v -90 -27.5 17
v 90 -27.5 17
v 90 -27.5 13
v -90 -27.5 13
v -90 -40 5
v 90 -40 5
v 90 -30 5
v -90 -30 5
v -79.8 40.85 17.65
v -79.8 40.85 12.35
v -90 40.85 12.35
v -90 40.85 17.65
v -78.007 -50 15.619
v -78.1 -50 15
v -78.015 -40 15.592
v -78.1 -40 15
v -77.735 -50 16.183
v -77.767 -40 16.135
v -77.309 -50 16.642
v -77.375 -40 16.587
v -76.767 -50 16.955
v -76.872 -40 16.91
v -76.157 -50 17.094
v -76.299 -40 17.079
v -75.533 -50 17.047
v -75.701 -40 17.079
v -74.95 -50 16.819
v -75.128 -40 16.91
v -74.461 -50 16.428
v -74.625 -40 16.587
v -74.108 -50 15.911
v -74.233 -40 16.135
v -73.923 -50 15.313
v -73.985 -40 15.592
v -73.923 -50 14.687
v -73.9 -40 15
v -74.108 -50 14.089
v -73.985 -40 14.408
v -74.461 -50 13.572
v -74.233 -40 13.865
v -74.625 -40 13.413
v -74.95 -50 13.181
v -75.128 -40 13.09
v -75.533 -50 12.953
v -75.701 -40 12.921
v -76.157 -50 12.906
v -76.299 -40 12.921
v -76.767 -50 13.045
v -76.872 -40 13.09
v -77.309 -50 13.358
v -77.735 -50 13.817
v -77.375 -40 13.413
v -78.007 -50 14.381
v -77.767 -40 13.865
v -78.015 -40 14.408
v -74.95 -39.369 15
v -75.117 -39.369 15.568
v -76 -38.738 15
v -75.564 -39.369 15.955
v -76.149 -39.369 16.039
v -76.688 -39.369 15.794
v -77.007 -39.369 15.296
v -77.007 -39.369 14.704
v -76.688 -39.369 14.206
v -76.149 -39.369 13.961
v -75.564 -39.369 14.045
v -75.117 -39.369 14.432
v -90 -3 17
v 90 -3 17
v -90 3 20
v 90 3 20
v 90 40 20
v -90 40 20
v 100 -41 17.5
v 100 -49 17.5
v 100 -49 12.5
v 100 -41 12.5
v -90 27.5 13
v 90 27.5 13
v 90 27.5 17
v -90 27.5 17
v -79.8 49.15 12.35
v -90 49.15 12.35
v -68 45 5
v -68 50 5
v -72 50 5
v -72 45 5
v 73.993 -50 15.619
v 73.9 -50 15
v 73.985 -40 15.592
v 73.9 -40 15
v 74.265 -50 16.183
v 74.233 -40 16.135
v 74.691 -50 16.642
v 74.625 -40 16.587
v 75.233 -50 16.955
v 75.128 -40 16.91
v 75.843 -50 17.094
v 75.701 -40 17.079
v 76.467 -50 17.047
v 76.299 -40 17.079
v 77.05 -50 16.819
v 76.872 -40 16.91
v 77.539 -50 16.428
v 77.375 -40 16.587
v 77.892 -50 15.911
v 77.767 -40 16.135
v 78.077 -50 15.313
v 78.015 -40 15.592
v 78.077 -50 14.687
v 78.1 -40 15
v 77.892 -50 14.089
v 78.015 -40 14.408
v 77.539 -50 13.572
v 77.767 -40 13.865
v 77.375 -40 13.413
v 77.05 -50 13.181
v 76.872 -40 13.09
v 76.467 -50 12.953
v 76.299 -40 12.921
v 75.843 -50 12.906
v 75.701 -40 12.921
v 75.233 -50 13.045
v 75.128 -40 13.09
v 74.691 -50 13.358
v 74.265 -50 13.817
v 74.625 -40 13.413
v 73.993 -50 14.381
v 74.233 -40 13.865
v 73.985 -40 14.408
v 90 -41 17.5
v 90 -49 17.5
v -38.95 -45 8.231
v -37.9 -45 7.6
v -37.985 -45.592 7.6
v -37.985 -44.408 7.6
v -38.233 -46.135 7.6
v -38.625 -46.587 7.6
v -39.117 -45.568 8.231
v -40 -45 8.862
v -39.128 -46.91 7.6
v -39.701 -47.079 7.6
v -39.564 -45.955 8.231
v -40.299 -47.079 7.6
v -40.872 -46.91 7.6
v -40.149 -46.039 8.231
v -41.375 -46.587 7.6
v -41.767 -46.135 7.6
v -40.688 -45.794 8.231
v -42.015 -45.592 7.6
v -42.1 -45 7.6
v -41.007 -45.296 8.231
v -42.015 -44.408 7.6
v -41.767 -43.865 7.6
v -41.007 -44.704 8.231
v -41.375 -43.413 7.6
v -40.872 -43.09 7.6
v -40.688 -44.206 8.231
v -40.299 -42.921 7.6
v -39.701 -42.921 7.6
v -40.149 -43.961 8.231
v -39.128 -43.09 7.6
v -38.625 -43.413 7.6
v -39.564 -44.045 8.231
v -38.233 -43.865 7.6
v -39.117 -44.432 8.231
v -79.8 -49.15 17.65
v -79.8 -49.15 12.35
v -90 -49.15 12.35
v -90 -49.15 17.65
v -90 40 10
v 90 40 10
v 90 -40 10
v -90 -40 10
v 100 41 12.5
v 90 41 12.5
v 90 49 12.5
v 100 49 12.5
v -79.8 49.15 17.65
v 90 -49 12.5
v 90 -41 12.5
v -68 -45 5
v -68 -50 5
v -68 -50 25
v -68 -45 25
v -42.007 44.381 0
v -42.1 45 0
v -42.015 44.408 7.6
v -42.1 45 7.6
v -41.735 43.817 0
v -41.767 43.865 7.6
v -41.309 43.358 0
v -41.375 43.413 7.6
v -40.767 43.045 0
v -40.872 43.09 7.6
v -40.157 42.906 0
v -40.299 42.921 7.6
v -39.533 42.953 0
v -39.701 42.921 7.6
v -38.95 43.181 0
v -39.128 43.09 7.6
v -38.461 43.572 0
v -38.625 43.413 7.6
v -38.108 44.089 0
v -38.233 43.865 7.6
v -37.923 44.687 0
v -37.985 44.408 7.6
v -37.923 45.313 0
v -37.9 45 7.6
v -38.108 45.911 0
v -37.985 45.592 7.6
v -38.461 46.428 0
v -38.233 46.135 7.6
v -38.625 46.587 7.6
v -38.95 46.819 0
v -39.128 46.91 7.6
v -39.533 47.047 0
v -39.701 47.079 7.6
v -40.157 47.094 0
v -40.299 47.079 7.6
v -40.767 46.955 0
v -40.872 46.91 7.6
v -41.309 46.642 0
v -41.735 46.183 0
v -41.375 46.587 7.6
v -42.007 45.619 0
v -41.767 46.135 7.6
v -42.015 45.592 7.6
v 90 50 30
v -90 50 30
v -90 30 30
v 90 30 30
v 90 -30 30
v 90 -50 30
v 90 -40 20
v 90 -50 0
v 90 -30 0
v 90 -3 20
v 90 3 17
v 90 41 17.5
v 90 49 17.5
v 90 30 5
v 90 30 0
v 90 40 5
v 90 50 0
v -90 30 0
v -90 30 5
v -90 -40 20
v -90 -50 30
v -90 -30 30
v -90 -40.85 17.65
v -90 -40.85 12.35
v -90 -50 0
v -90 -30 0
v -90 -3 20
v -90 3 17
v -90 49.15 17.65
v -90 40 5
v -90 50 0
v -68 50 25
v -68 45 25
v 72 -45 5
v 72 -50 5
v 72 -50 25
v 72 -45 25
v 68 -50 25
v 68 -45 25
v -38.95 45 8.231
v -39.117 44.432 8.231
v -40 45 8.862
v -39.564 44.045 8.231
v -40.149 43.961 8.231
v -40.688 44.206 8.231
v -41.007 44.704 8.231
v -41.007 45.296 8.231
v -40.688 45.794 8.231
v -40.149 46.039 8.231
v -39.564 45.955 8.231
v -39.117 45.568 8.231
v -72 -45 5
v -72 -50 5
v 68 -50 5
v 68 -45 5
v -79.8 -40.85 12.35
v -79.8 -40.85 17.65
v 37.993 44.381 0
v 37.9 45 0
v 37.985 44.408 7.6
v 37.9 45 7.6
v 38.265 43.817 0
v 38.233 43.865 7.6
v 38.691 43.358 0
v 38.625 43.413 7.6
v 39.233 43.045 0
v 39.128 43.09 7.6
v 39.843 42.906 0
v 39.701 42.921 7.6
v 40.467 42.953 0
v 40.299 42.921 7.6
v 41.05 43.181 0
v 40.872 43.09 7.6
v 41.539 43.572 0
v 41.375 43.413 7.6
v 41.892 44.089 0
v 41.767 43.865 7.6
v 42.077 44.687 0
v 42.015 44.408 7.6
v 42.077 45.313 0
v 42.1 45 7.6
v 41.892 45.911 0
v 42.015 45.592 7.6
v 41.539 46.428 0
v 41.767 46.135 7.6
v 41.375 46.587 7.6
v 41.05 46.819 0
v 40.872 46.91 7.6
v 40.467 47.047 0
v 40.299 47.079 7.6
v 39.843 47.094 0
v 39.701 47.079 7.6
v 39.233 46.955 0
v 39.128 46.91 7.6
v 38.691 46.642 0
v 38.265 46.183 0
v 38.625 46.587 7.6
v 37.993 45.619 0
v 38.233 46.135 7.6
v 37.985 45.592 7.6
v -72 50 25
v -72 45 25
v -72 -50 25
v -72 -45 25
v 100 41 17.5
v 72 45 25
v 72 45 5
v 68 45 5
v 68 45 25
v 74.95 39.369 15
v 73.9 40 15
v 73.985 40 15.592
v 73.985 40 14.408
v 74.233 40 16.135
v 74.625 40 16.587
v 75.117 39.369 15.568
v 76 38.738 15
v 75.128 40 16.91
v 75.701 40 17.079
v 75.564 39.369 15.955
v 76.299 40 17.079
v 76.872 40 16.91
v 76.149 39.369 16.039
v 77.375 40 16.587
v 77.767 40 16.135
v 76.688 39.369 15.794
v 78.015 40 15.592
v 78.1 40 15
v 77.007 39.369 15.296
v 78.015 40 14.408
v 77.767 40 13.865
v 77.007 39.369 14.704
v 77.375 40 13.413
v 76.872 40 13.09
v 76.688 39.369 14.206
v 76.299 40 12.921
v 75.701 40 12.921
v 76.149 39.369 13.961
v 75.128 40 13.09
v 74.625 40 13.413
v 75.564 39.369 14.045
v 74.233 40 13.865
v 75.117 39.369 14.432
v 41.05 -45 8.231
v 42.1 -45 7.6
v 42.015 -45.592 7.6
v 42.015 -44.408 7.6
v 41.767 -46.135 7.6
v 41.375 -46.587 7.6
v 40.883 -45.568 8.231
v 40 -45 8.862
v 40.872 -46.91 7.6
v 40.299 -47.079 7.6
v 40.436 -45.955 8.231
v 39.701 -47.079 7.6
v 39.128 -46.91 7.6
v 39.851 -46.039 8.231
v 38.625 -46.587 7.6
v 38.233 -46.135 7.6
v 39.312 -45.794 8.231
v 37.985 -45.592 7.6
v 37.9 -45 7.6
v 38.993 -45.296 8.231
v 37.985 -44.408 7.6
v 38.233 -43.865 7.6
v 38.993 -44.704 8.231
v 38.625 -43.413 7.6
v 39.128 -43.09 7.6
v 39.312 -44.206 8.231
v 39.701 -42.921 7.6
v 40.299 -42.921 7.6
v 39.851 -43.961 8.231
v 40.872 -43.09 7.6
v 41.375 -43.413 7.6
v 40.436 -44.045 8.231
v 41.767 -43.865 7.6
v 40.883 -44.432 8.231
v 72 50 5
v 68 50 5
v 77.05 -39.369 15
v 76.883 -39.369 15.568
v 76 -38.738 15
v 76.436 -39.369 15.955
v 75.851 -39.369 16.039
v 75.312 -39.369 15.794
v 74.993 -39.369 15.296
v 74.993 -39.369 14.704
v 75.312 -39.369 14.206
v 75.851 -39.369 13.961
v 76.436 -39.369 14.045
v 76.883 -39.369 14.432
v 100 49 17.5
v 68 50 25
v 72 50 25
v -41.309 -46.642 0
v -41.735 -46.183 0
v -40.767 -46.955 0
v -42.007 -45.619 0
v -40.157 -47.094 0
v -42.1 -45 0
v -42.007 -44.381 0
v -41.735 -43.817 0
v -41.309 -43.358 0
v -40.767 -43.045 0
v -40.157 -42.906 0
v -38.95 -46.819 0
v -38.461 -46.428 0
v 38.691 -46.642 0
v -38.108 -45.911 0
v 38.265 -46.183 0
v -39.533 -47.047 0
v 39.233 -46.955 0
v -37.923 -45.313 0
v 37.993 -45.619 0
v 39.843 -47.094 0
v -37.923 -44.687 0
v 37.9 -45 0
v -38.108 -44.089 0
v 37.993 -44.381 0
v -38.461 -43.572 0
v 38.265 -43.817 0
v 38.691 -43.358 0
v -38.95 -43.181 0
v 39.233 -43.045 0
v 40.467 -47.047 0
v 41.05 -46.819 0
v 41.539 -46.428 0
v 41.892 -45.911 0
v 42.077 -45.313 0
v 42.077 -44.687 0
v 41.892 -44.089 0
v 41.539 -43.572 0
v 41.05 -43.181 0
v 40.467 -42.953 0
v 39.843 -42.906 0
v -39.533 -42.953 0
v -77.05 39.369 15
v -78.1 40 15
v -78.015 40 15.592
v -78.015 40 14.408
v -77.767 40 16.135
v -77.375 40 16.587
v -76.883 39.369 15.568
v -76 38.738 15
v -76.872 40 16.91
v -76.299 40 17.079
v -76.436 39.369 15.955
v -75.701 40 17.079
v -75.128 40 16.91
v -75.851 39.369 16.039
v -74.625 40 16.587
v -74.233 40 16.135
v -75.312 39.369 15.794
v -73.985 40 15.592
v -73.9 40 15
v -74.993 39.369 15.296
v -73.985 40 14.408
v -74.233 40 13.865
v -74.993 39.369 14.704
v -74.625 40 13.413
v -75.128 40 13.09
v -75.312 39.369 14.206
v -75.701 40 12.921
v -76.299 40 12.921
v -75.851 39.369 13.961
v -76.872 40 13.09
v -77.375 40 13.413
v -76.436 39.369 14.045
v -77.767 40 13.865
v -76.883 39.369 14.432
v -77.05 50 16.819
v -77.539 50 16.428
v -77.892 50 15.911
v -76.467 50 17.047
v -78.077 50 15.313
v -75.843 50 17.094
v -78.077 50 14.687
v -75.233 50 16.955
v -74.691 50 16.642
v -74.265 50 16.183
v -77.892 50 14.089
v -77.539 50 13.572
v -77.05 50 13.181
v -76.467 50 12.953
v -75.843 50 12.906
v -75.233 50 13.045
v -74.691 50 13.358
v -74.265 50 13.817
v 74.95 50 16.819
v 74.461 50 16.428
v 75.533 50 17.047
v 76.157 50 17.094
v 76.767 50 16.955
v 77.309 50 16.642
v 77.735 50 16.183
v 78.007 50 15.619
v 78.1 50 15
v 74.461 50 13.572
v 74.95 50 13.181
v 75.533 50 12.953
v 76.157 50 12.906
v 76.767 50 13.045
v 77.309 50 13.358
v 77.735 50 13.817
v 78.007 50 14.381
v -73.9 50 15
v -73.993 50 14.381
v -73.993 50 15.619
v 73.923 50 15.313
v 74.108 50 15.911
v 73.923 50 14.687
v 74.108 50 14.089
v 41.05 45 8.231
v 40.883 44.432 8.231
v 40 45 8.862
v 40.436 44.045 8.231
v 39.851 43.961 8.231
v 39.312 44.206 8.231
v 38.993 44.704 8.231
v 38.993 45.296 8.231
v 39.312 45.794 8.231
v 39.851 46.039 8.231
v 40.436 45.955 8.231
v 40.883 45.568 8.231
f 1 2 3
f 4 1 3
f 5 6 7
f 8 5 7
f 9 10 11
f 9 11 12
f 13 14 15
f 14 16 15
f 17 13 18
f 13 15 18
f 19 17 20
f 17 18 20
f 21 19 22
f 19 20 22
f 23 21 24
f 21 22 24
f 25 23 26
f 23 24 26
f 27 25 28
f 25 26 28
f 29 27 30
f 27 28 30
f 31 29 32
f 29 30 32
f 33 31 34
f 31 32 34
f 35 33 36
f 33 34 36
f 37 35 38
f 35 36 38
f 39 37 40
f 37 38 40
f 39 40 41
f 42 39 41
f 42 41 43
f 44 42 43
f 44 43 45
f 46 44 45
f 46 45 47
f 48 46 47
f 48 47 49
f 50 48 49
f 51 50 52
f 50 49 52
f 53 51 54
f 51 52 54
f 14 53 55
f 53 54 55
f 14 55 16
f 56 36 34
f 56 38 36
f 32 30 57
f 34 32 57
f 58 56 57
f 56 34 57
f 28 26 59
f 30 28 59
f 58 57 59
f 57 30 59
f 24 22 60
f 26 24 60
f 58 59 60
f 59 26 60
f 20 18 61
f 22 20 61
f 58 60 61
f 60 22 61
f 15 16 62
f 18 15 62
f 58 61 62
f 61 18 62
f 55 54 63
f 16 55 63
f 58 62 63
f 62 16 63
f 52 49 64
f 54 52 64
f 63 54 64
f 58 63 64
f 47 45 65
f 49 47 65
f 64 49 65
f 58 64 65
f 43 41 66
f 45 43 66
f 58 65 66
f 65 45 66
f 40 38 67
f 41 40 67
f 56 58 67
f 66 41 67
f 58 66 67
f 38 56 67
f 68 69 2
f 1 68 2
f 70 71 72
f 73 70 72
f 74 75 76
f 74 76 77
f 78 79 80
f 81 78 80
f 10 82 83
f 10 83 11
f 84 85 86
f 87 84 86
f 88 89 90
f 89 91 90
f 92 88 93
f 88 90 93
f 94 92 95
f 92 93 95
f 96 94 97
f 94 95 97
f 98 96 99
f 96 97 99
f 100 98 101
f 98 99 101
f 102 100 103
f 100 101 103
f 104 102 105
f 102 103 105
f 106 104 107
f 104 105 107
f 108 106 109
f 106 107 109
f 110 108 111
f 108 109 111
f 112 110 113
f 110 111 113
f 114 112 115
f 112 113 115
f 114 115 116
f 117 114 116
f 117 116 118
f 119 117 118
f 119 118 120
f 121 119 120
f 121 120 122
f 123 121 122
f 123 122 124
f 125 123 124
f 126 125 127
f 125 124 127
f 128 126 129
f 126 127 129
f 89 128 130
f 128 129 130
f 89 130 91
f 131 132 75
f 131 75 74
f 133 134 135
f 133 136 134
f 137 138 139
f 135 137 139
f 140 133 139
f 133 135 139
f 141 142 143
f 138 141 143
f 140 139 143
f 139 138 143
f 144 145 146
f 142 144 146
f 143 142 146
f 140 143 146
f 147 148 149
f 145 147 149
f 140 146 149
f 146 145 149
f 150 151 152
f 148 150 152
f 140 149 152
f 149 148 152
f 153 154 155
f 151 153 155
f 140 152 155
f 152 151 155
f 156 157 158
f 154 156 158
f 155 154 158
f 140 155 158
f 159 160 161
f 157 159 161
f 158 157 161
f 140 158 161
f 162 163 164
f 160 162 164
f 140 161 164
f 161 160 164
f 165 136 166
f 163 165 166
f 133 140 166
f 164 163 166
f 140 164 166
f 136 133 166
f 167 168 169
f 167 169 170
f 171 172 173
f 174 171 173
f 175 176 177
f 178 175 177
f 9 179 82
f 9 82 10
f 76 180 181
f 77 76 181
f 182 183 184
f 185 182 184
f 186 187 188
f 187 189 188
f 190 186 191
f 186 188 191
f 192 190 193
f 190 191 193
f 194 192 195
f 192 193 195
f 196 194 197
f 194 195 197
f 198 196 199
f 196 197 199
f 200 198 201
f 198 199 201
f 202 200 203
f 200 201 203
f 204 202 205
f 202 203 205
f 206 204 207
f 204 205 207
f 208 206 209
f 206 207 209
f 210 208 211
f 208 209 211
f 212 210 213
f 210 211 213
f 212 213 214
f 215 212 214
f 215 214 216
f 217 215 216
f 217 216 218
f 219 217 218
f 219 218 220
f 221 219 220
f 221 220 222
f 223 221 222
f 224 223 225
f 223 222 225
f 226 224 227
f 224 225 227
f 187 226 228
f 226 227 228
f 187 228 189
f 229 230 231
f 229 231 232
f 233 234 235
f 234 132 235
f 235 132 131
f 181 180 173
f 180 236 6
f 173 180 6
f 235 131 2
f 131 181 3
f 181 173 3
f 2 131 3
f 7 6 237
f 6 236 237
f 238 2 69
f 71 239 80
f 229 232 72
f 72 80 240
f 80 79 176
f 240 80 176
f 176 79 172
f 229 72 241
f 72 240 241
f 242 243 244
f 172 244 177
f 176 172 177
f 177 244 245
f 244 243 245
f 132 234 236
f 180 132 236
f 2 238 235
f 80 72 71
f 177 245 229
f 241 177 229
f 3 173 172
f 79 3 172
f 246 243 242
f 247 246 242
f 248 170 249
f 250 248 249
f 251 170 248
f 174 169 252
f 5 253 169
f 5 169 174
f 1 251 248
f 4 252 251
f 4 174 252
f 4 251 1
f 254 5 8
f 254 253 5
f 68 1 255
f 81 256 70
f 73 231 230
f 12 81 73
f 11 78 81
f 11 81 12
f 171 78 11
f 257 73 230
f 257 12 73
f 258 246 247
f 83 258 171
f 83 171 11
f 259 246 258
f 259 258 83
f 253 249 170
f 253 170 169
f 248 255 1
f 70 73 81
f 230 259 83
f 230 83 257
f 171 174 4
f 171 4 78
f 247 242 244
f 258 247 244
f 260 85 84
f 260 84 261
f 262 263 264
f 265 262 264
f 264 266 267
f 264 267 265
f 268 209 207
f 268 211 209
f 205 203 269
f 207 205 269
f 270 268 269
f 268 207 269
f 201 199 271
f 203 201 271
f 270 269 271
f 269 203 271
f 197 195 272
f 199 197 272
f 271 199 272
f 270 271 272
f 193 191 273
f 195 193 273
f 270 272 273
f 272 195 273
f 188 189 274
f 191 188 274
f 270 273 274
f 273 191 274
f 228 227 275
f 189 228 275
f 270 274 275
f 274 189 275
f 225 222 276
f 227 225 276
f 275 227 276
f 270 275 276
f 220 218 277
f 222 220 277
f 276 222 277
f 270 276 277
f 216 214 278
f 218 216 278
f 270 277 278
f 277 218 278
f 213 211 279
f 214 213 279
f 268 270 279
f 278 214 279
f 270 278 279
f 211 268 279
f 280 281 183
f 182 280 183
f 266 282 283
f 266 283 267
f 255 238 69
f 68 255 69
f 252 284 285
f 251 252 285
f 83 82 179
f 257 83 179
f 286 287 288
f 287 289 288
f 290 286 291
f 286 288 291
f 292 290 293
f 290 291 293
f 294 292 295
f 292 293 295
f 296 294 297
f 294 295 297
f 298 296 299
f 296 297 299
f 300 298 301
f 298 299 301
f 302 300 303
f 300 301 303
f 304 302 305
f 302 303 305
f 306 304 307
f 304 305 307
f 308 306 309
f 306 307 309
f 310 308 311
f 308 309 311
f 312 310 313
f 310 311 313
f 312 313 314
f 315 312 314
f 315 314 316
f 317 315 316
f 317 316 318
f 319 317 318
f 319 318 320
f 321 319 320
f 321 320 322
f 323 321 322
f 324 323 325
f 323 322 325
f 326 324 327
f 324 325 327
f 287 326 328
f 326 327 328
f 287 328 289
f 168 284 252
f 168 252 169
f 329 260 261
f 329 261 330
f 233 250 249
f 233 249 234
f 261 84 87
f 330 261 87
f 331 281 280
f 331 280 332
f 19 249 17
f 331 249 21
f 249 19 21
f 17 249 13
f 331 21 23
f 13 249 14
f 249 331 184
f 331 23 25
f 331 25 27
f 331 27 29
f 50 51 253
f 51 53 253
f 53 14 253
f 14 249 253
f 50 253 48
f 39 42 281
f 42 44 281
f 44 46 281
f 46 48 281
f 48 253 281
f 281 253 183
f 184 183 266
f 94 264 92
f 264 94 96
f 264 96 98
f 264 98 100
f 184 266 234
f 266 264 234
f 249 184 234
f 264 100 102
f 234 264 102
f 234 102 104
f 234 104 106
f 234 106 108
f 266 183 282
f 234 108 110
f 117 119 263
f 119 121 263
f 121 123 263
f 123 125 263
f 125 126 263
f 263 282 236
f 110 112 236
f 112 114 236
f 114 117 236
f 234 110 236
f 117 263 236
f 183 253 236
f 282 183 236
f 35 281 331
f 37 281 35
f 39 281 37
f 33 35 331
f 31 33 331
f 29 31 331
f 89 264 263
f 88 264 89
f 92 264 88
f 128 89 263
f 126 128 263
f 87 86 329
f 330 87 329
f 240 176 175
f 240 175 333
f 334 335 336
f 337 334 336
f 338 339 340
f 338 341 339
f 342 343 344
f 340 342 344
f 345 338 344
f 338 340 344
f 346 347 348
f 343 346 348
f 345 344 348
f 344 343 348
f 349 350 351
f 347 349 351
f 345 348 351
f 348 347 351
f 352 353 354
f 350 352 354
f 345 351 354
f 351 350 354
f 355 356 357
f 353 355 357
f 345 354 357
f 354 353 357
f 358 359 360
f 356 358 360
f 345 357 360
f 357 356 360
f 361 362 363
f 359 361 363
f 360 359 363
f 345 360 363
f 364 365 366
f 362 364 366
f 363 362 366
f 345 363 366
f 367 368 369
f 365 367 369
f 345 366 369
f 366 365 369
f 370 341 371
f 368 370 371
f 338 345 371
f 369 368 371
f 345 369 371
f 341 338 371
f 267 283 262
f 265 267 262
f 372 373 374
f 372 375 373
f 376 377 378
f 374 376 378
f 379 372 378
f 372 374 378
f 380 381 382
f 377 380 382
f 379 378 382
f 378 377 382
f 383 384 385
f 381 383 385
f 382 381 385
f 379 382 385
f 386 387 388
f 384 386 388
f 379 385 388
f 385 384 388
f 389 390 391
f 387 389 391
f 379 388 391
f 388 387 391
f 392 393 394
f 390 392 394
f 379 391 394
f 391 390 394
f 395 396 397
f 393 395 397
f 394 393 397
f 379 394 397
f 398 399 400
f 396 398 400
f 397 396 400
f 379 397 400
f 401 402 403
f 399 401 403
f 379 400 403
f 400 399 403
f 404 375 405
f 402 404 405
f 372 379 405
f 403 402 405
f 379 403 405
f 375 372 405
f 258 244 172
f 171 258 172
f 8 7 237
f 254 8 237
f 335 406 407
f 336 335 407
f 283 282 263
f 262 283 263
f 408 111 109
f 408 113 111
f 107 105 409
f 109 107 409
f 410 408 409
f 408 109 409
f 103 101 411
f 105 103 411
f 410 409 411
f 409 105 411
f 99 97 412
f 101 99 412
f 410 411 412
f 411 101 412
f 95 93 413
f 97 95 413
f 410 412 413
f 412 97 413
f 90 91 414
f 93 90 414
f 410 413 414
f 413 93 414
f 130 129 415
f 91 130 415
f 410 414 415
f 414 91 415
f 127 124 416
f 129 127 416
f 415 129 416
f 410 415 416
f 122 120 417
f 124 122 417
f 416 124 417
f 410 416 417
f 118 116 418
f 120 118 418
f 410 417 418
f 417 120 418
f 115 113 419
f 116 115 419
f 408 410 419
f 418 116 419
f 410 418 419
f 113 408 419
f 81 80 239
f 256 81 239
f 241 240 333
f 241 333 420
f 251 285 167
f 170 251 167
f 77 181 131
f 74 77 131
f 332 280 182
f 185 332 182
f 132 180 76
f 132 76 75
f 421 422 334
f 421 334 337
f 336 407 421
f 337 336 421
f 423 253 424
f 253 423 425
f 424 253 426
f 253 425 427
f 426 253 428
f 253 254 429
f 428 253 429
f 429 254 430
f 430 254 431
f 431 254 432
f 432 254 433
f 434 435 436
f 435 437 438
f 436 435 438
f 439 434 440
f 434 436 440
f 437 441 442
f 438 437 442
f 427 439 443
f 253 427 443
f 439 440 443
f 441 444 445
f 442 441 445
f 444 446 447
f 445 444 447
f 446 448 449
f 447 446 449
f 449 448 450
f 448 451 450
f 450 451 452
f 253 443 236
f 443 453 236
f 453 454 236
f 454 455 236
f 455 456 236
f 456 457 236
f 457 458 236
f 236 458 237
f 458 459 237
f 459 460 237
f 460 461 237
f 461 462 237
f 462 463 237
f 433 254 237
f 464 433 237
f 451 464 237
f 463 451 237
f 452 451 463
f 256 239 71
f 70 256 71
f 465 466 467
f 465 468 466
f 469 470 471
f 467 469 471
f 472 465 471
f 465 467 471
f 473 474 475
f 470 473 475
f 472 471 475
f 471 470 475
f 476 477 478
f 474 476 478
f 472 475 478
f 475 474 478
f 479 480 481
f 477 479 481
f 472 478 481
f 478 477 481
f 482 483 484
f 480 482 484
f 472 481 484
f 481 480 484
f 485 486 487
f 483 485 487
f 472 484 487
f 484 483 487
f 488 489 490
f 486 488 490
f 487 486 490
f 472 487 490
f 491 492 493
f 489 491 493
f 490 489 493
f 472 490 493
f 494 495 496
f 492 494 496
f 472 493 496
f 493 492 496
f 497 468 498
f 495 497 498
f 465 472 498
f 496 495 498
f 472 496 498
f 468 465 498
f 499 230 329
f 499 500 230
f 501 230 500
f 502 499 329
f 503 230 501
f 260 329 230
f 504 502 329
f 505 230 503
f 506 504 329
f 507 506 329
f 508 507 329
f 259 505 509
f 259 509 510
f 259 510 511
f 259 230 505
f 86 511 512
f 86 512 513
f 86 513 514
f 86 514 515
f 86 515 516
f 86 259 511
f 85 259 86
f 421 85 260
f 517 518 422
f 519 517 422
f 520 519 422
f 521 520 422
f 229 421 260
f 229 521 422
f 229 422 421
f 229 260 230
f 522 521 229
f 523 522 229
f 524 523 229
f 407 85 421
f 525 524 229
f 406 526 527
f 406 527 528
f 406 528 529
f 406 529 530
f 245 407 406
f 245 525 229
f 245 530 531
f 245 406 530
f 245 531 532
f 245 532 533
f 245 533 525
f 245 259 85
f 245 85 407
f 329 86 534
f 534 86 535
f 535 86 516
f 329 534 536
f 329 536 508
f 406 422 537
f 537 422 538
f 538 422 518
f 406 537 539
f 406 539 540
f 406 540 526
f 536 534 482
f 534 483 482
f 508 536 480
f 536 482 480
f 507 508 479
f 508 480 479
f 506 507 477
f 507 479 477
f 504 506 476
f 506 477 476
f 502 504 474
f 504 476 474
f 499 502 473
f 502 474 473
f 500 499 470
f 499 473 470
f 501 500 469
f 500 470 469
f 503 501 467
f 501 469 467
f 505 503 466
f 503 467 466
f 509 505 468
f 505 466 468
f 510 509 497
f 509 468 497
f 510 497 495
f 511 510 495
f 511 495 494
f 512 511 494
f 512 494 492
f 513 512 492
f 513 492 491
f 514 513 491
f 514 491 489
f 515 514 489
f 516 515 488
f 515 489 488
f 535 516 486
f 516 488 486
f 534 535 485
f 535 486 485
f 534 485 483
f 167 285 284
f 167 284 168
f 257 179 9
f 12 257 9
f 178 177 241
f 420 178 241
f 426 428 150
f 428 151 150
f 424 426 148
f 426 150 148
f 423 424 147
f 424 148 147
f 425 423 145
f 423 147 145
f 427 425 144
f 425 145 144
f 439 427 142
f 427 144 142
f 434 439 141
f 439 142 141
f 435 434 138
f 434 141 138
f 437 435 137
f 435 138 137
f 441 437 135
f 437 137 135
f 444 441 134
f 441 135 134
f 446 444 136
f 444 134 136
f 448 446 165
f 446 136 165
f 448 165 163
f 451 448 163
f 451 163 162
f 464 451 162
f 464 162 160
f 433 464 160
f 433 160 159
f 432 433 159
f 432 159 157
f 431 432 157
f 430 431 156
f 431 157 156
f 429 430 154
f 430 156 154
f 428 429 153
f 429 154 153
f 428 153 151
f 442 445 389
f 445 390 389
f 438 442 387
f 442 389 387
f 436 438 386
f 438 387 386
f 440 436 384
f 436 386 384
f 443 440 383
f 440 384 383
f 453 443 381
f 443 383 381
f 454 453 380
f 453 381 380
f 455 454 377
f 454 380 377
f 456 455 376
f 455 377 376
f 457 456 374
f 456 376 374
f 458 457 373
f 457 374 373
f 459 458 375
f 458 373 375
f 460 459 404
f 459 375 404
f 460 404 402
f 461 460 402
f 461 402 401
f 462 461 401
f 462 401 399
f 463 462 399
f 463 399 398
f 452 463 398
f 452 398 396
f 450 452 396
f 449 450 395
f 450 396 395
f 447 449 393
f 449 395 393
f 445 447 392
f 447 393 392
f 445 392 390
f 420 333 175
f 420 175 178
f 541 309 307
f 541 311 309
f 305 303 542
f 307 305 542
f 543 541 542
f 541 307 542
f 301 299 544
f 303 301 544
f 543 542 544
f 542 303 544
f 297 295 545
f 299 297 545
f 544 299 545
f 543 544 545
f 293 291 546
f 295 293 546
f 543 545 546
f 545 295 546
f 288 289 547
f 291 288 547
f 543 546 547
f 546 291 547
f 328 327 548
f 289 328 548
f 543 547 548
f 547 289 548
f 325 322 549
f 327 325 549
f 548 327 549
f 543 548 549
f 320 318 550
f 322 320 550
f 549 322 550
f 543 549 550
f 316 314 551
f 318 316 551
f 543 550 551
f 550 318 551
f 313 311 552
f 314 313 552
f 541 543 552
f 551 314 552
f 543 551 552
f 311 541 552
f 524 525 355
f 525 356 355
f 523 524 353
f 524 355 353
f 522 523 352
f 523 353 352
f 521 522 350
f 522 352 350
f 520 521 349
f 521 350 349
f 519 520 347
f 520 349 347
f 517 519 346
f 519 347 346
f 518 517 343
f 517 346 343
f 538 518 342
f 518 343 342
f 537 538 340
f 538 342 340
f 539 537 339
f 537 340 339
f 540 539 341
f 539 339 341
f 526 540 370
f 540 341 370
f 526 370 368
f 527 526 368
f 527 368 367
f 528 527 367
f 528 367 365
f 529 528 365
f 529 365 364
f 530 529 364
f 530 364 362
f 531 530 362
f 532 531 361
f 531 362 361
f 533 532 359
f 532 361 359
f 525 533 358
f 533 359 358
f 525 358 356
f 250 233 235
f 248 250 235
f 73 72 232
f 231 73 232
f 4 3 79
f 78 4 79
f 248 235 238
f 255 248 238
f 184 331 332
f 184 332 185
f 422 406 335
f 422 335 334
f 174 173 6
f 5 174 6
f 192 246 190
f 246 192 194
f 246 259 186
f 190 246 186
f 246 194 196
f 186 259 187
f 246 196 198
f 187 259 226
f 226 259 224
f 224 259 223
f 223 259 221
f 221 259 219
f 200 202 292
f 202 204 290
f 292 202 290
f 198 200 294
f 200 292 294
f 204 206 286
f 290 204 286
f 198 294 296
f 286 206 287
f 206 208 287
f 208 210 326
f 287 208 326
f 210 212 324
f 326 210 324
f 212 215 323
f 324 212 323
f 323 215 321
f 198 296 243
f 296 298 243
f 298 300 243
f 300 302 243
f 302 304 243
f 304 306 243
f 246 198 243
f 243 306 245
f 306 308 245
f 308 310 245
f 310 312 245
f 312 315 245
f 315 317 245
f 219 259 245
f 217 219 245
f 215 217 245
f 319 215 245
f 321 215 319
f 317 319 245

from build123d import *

# Parameters (mm, degrees)
F0_W      = 180
F0_H      = 100
F1_DEPTH  = 30
F3_DEPTH  = 180
F4_W      = 8
F4_H      = 5
F5_DEPTH  = 10
F6_W      = 8.3
F6_H      = 5.3
F7_DEPTH  = 10.2
F8_W      = 4
F8_H      = 20
F9_DEPTH  = 5
F10_W     = 4
F10_H     = 20
F11_DEPTH = 5
F12_D     = 4.2
F12_DEPTH = 10
F12_TIP   = 1.2618073
F13_D     = 4.2
F13_DEPTH = 10
F13_TIP   = 1.2618073
F15_D     = 4.2
F15_DEPTH = 7.6
F15_TIP   = 1.2618073


with BuildPart() as f1:
    # F0 (on Top) → F1 (new body)
    with BuildSketch(Plane.XY):
        Rectangle(F0_W, F0_H)
    extrude(amount=F1_DEPTH)

    # F2 (on face) → F3 (cut)
    with BuildSketch(Plane.YZ.offset(90)):
        Polygon((30, 30), (-30, 30), (-40, 20), (-3, 20), (3, 20), (40, 20), align=None)
        Polygon((-30, 5), (-30, 0), (30, 0), (30, 5), (40, 5), (40, 10), (-40, 10), (-40, 5), align=None)
        Polygon((3, 20), (-3, 20), (-3, 17), (-27.5, 17), (-27.5, 13), (27.5, 13), (27.5, 17), (3, 17), align=None)
    extrude(amount=-F3_DEPTH, mode=Mode.SUBTRACT)

    # F4 (on face) → F5 (join)
    with BuildSketch(Plane.YZ.offset(90)):
        with Locations((-45, 15)):
            Rectangle(F4_W, F4_H)
        with Locations((45, 15)):
            Rectangle(F4_W, F4_H)
    extrude(amount=F5_DEPTH)

    # F6 (on face) → F7 (cut)
    with BuildSketch(Plane(origin=(-90, 0, 0), x_dir=(0, -1, 0), z_dir=(-1, 0, 0))):
        with Locations((-45, 15)):
            Rectangle(F6_W, F6_H)
        with Locations((45, 15)):
            Rectangle(F6_W, F6_H)
    extrude(amount=-F7_DEPTH, mode=Mode.SUBTRACT)

    # F8 (on face) → F9 (cut)
    with BuildSketch(Plane.XZ.offset(50)):
        with Locations((-70, 15)):
            Rectangle(F8_W, F8_H)
        with Locations((70, 15)):
            Rectangle(F8_W, F8_H)
    extrude(amount=-F9_DEPTH, mode=Mode.SUBTRACT)

    # F10 (on face) → F11 (cut)
    with BuildSketch(Plane(origin=(0, 50, 0), x_dir=(-1, 0, 0), z_dir=(0, 1, 0))):
        with Locations((70, 15)):
            Rectangle(F10_W, F10_H)
        with Locations((-70, 15)):
            Rectangle(F10_W, F10_H)
    extrude(amount=-F11_DEPTH, mode=Mode.SUBTRACT)

    # F12
    with Locations(Plane.XZ.offset(50)):
        with Locations((-76, 15), (76, 15)):
            Hole(F12_D / 2, depth=F12_DEPTH)
            with Locations((0, 0, -(F12_DEPTH + F12_TIP / 2))):  # 118° drill point
                Cone(0, F12_D / 2, F12_TIP, mode=Mode.SUBTRACT)

    # F13
    with Locations(Plane(origin=(0, 50, 0), x_dir=(-1, 0, 0), z_dir=(0, 1, 0))):
        with Locations((-76, 15), (76, 15)):
            Hole(F13_D / 2, depth=F13_DEPTH)
            with Locations((0, 0, -(F13_DEPTH + F13_TIP / 2))):  # 118° drill point
                Cone(0, F13_D / 2, F13_TIP, mode=Mode.SUBTRACT)

    # F15
    with Locations(Plane(origin=(0, 0, 0), x_dir=(1, 0, 0), z_dir=(0, 0, -1))):
        with Locations((-40, 45), (40, 45), (40, -45), (-40, -45)):
            Hole(F15_D / 2, depth=F15_DEPTH)
            with Locations((0, 0, -(F15_DEPTH + F15_TIP / 2))):  # 118° drill point
                Cone(0, F15_D / 2, F15_TIP, mode=Mode.SUBTRACT)


solid = f1.part
